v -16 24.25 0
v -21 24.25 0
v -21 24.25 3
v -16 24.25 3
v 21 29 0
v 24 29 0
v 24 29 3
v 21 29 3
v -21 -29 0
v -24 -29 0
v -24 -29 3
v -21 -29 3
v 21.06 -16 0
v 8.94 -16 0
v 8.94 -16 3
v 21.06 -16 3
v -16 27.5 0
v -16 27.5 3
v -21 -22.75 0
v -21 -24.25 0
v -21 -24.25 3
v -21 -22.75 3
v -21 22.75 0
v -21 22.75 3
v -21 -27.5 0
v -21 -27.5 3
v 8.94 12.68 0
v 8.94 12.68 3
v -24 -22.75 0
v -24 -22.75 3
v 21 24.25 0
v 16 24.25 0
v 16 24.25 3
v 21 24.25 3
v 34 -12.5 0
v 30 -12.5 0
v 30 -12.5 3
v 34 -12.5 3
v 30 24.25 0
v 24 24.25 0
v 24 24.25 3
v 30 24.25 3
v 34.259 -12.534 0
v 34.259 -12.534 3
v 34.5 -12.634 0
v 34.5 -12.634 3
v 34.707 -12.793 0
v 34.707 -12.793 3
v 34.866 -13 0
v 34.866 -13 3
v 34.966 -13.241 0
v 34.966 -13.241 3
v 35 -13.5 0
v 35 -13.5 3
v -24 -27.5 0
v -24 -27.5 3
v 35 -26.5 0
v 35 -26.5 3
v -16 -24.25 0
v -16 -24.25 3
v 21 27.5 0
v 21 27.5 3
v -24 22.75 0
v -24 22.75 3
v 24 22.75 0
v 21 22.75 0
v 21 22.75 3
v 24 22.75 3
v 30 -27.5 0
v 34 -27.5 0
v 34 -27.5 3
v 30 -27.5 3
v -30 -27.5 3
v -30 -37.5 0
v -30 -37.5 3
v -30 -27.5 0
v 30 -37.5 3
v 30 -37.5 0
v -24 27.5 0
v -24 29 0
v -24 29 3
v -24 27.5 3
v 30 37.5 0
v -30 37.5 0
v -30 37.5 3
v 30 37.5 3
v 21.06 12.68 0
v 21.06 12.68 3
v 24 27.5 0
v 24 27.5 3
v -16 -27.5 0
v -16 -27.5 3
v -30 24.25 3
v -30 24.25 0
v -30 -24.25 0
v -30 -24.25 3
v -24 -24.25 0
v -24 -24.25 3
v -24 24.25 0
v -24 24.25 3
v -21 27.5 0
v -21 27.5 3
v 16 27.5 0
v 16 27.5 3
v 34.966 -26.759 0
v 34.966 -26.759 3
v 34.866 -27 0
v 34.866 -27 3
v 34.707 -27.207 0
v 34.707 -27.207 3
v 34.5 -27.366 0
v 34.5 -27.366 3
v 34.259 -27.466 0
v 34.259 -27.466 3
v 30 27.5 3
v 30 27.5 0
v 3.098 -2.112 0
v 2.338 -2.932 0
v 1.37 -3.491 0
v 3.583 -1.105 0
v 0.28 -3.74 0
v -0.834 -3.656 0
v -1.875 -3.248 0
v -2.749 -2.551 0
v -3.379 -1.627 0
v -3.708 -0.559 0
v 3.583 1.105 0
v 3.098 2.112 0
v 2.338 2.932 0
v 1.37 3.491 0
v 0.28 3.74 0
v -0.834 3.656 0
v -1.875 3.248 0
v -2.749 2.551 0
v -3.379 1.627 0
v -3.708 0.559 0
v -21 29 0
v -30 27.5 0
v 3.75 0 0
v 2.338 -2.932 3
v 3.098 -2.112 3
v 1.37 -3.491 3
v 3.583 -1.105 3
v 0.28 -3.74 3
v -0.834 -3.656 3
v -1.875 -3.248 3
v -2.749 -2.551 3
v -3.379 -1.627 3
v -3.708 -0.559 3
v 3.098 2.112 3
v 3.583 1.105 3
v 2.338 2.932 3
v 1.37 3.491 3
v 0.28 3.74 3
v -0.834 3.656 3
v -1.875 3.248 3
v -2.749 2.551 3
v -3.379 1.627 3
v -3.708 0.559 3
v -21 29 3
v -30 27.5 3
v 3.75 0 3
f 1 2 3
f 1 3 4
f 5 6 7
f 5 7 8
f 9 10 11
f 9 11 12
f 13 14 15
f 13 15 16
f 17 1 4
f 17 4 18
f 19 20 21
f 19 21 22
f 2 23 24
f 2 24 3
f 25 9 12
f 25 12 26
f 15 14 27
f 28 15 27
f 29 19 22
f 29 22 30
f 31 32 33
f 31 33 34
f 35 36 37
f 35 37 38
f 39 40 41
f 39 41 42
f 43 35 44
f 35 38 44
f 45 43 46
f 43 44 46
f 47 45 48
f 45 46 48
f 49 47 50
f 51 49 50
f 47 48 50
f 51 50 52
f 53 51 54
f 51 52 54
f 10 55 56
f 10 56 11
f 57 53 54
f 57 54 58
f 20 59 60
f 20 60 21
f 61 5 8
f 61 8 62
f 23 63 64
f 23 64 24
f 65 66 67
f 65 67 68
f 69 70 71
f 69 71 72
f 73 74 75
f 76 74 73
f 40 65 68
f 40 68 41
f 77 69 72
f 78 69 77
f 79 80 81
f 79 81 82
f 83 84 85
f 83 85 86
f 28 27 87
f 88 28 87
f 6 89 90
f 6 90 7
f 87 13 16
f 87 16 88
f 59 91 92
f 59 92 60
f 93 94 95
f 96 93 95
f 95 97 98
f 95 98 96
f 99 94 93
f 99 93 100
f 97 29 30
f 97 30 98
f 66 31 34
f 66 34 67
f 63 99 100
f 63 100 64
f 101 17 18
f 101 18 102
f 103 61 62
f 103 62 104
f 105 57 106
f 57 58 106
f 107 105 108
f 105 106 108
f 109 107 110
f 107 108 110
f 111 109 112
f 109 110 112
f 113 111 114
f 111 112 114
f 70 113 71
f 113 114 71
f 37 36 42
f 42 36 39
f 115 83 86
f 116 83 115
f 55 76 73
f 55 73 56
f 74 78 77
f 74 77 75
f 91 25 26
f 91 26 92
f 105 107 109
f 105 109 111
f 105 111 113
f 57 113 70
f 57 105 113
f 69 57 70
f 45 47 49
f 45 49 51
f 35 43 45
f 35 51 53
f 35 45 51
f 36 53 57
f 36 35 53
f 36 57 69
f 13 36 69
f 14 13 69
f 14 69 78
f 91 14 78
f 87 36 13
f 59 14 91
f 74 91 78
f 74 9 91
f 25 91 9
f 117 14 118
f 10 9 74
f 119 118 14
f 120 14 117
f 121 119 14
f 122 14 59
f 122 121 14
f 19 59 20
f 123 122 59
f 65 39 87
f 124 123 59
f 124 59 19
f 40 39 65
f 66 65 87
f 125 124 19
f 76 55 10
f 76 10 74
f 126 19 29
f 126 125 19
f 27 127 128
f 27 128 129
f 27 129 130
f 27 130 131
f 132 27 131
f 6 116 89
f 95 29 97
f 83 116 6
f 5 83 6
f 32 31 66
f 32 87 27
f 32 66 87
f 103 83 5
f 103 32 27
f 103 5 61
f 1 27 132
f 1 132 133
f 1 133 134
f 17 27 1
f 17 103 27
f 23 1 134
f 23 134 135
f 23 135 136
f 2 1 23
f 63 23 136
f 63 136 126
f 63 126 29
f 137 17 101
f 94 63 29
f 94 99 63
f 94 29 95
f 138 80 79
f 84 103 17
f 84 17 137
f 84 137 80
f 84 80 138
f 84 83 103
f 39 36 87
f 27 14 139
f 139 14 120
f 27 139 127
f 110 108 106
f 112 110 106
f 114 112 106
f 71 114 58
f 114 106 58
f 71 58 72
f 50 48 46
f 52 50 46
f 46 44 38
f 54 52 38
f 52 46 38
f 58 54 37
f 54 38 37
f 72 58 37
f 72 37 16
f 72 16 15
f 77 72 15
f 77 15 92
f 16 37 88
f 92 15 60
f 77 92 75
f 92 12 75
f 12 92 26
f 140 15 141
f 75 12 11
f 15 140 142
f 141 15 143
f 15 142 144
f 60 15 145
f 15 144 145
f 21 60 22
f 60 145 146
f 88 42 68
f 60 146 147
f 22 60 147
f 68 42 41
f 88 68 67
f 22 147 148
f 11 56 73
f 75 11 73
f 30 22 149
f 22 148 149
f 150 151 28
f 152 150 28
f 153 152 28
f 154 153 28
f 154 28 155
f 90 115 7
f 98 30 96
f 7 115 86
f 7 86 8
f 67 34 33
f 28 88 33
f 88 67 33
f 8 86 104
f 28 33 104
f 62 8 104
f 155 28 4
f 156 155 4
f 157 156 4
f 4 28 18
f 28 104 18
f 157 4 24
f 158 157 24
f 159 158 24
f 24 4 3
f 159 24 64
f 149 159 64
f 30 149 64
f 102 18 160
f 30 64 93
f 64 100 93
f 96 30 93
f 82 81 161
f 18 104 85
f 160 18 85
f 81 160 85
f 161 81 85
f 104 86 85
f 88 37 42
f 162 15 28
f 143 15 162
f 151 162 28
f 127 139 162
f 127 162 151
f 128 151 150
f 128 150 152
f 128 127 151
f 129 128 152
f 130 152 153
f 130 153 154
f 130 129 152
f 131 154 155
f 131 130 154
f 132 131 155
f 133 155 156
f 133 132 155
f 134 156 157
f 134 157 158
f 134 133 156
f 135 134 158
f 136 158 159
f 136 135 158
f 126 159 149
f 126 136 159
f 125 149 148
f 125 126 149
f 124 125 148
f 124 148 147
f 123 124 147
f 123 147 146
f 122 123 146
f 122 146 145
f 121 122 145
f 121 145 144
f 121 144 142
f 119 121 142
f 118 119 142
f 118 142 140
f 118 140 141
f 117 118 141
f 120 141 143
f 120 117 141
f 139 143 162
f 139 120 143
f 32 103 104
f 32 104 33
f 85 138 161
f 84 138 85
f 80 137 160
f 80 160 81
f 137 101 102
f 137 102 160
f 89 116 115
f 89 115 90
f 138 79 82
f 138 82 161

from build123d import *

# Parameters (mm, degrees)
ESQUISSE1_R        = 3.75
ESQUISSE1_W        = 12.12
ESQUISSE1_H        = 28.68
BOSS_EXTRU_1_DEPTH = 3
CONG_3_R           = 1


with BuildPart() as part:
    # Esquisse1 → Boss.-Extru.1 (new body)
    with BuildSketch(Plane.XY):
        Polygon((-30, 37.5), (30, 37.5), (30, 27.5), (24, 27.5), (24, 29), (21, 29), (21, 27.5), (16, 27.5), (16, 24.25), (21, 24.25), (21, 22.75), (24, 22.75), (24, 24.25), (30, 24.25), (30, 12.5), (30, -12.5), (35, -12.5), (35, -27.5), (30, -27.5), (30, -37.5), (-30, -37.5), (-30, -27.5), (-24, -27.5), (-24, -29), (-21, -29), (-21, -27.5), (-16, -27.5), (-16, -24.25), (-21, -24.25), (-21, -22.75), (-24, -22.75), (-24, -24.25), (-30, -24.25), (-30, -12.5), (-30, 12.5), (-30, 24.25), (-24, 24.25), (-24, 22.75), (-21, 22.75), (-21, 24.25), (-16, 24.25), (-16, 27.5), (-21, 27.5), (-21, 29), (-24, 29), (-24, 27.5), (-30, 27.5), align=None)
        Circle(ESQUISSE1_R, mode=Mode.SUBTRACT)
        with Locations((15, -1.66)):
            Rectangle(ESQUISSE1_W, ESQUISSE1_H, mode=Mode.SUBTRACT)
    extrude(amount=BOSS_EXTRU_1_DEPTH)

    # Congé3
    cong_3_edges = [part.edges().sort_by_distance(p)[0] for p in [
        (35, -12.5, 1.5),
        (35, -27.5, 1.5),
    ]]
    fillet(cong_3_edges, radius=CONG_3_R)


solid = part.part
